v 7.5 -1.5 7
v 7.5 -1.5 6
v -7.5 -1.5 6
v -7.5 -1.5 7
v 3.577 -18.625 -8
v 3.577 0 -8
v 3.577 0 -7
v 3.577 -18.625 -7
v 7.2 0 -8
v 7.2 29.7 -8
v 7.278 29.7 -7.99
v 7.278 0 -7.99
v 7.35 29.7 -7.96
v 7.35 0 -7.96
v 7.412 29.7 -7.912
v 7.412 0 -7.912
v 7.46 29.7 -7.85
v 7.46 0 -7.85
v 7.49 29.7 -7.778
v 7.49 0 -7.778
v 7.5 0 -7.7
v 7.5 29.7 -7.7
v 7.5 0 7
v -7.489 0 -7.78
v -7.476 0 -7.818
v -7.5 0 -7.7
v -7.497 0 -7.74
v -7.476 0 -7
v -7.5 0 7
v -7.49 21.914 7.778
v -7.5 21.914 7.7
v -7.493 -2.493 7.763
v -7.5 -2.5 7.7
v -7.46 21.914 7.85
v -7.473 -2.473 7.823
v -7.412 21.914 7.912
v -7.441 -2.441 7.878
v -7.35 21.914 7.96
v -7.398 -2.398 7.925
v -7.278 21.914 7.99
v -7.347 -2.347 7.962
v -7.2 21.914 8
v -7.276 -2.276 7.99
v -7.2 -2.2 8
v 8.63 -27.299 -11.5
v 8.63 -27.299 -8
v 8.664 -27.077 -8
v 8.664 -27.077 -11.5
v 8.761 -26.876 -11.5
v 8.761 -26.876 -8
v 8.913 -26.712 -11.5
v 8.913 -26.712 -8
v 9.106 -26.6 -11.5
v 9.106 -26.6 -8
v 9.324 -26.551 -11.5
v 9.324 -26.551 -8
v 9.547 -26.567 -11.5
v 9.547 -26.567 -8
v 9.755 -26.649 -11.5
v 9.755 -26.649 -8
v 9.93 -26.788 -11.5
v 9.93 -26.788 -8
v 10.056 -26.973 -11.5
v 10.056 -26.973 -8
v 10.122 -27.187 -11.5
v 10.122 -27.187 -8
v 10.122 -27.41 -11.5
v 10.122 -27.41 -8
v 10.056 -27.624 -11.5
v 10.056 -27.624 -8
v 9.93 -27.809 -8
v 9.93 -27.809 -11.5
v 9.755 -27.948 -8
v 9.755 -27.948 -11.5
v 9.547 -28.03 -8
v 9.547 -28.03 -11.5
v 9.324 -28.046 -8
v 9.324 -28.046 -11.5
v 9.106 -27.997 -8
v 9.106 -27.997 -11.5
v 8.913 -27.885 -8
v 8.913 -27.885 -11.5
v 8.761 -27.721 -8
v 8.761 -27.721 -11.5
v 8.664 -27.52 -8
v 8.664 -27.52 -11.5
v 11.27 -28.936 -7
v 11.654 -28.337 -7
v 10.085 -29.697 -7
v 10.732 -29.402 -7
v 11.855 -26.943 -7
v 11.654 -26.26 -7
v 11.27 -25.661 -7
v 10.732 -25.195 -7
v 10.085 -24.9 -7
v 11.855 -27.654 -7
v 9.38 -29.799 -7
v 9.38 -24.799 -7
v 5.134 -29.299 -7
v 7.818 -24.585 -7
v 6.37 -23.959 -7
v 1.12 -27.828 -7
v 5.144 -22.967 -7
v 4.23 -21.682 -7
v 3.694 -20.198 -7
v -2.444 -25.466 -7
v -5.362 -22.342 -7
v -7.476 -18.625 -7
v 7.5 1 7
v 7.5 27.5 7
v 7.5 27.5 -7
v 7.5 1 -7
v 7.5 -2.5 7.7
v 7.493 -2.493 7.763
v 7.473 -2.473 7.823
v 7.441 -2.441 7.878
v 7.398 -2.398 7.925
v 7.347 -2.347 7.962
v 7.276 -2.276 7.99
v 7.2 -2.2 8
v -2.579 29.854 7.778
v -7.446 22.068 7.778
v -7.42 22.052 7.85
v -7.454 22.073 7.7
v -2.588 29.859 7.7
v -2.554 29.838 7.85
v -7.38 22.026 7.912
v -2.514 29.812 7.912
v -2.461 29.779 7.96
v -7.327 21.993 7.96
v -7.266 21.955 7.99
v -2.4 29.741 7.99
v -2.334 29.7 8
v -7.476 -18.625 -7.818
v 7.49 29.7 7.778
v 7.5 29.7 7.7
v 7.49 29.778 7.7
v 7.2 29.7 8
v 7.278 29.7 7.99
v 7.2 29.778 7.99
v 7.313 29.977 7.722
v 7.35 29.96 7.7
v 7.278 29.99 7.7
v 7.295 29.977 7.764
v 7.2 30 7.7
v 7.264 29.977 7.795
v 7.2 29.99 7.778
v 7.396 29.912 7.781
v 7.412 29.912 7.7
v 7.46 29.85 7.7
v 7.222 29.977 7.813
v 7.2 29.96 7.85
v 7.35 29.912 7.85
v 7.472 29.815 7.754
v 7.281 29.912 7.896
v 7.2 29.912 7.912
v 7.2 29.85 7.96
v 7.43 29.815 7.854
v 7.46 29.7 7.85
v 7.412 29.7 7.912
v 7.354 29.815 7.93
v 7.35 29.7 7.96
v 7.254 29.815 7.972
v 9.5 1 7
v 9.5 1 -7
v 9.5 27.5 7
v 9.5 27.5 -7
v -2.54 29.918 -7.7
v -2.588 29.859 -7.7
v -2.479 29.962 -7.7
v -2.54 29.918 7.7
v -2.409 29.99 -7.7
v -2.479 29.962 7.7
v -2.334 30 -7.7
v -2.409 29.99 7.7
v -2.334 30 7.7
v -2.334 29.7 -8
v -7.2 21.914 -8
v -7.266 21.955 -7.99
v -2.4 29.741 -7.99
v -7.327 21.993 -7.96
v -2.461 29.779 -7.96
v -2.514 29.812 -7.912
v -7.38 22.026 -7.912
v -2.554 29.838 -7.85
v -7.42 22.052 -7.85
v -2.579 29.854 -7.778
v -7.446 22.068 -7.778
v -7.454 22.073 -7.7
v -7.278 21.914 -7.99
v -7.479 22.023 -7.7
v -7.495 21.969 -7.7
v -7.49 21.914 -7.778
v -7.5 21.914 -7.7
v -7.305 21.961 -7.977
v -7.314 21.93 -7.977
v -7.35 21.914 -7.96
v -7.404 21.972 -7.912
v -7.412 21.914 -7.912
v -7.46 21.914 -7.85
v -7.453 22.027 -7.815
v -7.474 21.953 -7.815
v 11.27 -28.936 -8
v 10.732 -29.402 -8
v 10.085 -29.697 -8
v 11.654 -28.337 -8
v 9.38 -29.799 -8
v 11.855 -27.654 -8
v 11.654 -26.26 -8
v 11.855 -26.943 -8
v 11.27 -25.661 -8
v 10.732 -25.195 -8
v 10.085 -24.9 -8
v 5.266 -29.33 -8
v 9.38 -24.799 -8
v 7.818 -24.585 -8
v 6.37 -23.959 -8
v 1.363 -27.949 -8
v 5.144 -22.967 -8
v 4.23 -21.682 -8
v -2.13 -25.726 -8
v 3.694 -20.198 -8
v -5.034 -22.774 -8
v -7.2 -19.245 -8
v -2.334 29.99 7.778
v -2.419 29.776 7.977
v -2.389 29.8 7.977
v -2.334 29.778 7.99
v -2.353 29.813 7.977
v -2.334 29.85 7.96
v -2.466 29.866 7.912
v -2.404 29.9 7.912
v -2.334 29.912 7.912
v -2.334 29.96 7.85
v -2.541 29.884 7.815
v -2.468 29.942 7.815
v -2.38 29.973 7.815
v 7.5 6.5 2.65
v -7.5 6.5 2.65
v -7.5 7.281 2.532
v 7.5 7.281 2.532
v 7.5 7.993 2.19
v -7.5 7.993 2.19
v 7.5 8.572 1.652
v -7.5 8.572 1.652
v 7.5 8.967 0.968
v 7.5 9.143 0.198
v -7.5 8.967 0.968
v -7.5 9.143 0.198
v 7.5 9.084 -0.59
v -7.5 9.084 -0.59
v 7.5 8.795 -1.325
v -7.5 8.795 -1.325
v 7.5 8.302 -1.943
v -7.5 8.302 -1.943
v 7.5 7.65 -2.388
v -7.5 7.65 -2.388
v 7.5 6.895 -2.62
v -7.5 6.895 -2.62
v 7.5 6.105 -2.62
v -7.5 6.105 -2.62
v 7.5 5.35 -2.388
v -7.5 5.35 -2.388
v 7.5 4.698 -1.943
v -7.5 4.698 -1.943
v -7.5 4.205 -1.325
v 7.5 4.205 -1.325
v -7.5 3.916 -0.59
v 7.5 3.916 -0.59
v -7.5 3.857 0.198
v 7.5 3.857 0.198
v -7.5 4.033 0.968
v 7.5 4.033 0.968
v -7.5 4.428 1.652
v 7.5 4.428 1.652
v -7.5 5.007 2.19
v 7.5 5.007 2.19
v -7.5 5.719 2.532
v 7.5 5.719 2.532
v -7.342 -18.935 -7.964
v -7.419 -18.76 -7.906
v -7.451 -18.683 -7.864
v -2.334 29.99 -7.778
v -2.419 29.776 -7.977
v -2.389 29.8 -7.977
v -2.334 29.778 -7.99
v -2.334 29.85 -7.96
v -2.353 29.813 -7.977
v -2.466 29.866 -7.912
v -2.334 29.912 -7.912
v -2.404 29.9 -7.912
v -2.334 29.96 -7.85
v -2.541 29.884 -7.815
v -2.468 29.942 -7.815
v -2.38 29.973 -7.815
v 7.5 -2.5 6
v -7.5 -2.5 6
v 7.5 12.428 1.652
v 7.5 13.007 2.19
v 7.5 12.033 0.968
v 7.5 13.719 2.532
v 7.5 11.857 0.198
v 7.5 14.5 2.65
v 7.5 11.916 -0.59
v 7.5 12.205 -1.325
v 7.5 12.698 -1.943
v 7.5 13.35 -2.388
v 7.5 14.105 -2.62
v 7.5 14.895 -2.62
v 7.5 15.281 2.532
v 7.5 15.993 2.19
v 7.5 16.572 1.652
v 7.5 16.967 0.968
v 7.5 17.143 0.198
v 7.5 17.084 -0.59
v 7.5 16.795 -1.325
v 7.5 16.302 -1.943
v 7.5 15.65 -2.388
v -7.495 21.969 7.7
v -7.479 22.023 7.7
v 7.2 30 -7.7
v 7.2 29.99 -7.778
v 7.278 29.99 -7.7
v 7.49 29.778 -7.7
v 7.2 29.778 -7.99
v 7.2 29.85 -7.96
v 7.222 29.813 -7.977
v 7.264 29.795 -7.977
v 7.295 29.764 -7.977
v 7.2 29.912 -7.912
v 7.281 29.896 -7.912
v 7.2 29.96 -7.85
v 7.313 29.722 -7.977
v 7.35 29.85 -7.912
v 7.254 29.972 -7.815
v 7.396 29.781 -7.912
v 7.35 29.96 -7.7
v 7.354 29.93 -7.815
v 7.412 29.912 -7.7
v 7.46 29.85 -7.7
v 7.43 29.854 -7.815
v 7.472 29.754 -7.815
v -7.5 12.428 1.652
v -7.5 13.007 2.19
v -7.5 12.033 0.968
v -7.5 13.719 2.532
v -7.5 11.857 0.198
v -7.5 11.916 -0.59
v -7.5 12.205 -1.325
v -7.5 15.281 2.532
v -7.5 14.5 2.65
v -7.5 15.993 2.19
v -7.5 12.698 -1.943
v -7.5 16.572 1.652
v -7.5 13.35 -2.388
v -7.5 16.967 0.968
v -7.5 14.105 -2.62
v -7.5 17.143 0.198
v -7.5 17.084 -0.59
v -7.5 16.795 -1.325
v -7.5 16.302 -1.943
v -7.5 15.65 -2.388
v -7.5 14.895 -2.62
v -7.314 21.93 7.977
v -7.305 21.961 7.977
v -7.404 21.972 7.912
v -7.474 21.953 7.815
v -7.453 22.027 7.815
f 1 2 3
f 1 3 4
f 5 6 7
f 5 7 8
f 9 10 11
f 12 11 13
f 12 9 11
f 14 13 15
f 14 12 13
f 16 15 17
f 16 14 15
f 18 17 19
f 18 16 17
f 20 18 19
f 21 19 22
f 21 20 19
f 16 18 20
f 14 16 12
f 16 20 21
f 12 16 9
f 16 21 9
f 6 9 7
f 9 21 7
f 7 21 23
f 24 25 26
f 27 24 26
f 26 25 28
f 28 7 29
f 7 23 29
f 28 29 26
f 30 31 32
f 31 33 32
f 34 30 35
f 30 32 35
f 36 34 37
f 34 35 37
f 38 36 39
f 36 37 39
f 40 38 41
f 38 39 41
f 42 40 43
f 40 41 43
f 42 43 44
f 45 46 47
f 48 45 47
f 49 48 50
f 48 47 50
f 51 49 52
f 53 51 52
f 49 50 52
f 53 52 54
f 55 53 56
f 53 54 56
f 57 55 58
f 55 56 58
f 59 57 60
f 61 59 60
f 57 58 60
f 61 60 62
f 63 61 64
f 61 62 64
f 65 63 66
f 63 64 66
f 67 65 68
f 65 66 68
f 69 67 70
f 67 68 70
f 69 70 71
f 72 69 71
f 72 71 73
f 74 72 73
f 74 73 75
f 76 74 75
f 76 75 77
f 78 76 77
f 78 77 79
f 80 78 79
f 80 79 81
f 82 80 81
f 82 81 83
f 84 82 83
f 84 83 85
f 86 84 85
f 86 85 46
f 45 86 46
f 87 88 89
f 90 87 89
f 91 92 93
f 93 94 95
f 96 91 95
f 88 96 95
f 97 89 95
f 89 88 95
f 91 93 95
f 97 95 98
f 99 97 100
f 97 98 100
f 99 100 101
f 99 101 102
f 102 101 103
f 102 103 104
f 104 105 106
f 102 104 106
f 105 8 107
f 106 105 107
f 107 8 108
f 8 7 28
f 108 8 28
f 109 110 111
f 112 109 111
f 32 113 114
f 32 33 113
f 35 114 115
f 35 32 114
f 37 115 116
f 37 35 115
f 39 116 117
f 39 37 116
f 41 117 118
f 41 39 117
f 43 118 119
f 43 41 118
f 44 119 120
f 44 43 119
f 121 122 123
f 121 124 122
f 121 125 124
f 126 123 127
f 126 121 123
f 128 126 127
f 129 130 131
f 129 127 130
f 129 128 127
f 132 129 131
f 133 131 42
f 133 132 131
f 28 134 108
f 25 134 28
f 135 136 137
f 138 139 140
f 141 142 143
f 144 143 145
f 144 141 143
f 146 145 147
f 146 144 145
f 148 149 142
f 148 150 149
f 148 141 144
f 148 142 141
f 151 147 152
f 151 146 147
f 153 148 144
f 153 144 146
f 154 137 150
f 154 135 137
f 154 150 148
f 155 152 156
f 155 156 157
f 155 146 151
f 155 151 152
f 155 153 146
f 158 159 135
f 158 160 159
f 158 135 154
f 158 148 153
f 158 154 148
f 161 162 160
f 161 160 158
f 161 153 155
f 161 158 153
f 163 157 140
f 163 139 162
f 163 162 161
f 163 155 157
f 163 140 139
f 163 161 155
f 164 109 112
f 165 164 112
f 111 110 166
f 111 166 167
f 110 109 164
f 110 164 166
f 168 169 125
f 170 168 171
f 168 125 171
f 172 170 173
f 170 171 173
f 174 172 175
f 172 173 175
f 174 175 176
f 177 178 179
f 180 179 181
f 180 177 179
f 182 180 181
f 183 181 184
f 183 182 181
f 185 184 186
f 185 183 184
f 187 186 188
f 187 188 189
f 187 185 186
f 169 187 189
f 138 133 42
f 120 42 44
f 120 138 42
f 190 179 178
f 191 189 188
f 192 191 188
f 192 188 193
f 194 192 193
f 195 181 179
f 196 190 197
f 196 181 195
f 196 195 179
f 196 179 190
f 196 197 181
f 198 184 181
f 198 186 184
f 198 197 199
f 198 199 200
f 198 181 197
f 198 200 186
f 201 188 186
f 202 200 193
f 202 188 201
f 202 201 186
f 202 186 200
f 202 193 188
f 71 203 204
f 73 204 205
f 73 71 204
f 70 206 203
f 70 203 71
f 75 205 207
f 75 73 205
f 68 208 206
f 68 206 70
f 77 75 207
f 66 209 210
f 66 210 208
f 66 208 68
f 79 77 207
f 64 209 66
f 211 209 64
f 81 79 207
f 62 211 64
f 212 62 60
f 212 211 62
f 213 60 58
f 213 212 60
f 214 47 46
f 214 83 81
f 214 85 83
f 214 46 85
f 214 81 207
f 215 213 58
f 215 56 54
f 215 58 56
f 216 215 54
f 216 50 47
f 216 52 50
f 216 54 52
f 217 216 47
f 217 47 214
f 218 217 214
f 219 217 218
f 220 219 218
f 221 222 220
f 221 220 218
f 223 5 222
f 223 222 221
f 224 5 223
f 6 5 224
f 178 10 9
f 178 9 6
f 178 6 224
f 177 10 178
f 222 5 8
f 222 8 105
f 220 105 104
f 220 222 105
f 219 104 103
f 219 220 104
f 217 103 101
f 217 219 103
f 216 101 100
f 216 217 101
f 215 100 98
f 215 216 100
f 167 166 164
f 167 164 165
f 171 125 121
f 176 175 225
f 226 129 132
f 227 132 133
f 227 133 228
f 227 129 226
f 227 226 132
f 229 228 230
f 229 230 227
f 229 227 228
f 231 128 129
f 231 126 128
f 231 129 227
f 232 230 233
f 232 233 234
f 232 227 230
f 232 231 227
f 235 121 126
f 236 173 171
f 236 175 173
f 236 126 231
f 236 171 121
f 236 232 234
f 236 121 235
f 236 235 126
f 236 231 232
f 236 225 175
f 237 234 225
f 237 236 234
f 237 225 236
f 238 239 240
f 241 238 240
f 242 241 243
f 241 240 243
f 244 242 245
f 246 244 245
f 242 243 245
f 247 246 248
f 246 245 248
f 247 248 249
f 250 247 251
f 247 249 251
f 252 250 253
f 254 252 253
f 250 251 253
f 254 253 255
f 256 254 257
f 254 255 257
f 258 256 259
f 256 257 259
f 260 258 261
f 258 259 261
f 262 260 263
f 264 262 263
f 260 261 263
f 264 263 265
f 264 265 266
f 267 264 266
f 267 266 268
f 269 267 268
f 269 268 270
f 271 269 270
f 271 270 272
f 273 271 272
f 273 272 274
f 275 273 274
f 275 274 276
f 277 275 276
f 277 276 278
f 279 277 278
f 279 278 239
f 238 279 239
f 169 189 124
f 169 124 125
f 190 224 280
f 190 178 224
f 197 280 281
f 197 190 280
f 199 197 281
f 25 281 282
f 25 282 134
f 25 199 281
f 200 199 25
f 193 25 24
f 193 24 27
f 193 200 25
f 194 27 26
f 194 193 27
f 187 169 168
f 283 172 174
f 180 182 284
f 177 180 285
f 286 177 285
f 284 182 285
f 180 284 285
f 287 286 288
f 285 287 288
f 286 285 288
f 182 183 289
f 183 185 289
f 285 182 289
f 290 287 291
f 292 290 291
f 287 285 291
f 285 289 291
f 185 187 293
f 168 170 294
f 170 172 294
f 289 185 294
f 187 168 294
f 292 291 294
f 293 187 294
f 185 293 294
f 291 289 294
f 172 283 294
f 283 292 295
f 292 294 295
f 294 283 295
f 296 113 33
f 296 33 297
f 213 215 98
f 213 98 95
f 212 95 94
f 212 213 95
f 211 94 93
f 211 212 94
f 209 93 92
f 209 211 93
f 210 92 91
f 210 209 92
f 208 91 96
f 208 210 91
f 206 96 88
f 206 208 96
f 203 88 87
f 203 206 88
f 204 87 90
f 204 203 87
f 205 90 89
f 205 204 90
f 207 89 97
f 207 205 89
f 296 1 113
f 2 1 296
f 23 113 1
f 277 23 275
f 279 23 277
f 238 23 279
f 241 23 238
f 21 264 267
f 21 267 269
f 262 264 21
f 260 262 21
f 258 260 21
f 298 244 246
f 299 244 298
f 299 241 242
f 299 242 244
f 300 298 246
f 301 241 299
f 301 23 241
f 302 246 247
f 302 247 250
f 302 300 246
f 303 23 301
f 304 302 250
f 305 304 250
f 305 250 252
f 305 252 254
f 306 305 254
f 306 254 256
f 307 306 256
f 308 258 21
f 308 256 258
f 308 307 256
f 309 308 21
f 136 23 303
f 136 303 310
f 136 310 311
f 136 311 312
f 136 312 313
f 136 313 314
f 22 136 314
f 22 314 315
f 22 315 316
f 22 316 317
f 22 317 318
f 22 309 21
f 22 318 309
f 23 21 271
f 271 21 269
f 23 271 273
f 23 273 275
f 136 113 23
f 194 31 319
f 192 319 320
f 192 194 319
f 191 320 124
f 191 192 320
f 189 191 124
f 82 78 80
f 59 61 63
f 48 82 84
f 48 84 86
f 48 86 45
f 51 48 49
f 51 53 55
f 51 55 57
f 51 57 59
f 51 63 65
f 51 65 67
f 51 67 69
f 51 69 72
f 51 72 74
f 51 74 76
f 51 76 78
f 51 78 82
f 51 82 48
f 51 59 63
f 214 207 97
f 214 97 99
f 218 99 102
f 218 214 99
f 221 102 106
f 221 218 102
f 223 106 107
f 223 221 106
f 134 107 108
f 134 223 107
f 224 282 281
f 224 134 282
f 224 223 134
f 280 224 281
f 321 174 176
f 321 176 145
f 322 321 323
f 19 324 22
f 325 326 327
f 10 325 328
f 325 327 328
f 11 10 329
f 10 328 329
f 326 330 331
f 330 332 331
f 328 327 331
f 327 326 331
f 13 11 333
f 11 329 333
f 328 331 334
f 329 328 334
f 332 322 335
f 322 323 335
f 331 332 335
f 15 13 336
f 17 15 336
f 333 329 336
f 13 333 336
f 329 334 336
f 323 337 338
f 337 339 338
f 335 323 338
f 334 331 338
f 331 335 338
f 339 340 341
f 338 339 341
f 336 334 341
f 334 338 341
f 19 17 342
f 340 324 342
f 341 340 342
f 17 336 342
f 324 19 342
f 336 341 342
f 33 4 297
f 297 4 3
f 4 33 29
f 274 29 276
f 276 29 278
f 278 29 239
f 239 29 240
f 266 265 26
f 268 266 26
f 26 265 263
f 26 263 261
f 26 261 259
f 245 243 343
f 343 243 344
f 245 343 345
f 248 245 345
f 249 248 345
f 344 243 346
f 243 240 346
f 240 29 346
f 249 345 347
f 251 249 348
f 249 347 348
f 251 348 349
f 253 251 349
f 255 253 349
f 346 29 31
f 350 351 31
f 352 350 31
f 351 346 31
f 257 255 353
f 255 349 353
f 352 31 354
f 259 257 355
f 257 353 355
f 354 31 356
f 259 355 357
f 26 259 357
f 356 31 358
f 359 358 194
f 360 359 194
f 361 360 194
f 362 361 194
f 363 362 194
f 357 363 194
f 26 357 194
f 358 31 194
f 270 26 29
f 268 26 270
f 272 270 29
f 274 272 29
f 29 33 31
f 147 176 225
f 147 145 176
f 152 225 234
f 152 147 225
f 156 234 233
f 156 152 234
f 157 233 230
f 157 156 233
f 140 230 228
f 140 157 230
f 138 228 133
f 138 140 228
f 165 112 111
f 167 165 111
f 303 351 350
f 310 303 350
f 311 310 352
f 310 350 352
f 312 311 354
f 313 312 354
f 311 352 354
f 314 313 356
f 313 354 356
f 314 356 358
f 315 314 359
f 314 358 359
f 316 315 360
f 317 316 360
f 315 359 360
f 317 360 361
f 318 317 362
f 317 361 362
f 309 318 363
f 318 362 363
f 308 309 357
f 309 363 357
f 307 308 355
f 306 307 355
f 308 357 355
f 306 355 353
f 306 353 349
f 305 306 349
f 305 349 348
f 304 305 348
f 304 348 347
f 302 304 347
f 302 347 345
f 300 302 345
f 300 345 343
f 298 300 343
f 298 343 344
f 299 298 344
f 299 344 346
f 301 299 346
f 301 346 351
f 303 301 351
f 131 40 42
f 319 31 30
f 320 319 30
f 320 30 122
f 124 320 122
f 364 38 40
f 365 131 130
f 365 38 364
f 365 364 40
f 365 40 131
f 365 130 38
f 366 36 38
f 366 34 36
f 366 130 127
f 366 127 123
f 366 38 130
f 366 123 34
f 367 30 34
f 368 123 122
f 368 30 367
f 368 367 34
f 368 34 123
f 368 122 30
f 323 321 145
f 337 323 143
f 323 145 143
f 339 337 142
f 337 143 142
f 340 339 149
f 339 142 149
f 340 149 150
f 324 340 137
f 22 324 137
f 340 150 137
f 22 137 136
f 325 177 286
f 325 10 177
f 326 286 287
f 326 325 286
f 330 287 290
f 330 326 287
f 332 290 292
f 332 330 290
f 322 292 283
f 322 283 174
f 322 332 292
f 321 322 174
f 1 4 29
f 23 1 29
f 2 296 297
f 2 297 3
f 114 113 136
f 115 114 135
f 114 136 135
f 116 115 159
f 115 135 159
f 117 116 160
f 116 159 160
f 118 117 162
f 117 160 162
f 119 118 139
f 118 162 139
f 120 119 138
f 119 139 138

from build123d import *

# Parameters (mm, degrees)
BOSS_EXTRUDE1_DEPTH      = 8
BOSS_EXTRUDE4_DEPTH      = 15
SKETCH3_R                = 2.65
CUT_EXTRUDE1_DEPTH       = 35.481879299
SKETCH5_W                = 14
SKETCH5_H                = 26.5
BOSS_EXTRUDE6_DEPTH      = 2
SKETCH6_R                = 2.5
SKETCH6_R_2              = 0.75
BOSS_EXTRUDE7_DEPTH      = 1
BOSS_EXTRUDE8_DEPTH      = 3.5
BOSS_EXTRUDE8_DEPTH_BACK = 1
SKETCH6_3_R              = 0.75
FILLET1_R                = 0.3


with BuildPart() as part:
    # Sketch1 → Boss-Extrude1 (new, symmetric)
    with BuildSketch(Plane.XY):
        Polygon((7.5, 0), (-7.5, 0), (-7.5, 22), (-2.5, 30), (7.5, 30), align=None)
    extrude(amount=BOSS_EXTRUDE1_DEPTH, both=True)

    # Sketch2 → Boss-Extrude4 (add, through all)
    with BuildSketch(Plane(origin=(7.5, 0, 0), x_dir=(0, 0, -1), z_dir=(1, 0, 0))):
        Polygon((-7, 0), (-8, 0), (-8, -2.5), (-6, -2.5), (-6, -1.5), (-7, -1.5), align=None)
    extrude(amount=-BOSS_EXTRUDE4_DEPTH)

    # Sketch3 → Cut-Extrude1 (cut, through all)
    with BuildSketch(Plane.ZY.offset(7.5)):
        with Locations((0, 14.5)):
            Circle(SKETCH3_R)
        with Locations((0, 6.5)):
            Circle(SKETCH3_R)
    extrude(amount=-CUT_EXTRUDE1_DEPTH, mode=Mode.SUBTRACT)

    # Sketch6 → Boss-Extrude7 (add)
    # profile 1 of 2: a face of its own
    with BuildSketch(Plane(origin=(0, 0, -8), x_dir=(-1, 0, 0), z_dir=(0, 0, -1))):
        with BuildLine():
            ThreePointArc((-9.380331513, -29.798564223), (0.731298937, -26.751572871), (7.475992833, -18.625175706))
            Line((7.475992833, -18.625175706), (7.475992833, 0))
            Line((7.475992833, 0), (-3.577226639, 0))
            Line((-3.577226639, 0), (-3.577226639, -18.625175706))
            ThreePointArc((-3.577226639, -18.625175706), (-5.143978366, -22.966608507), (-9.380331513, -24.798564223))
            ThreePointArc((-9.380331513, -24.798564223), (-7.61256456, -25.53079727), (-6.880331513, -27.298564223))
            ThreePointArc((-6.880331513, -27.298564223), (-7.61256456, -29.066331176), (-9.380331513, -29.798564223))
        make_face()
    # profile 2 of 2: a face of its own
    with BuildSketch(Plane(origin=(0, 0, -8), x_dir=(-1, 0, 0), z_dir=(0, 0, -1))):
        with Locations((-9.380331513, -27.298564223)):
            Circle(SKETCH6_R)
        with Locations((-9.380331513, -27.298564223)):
            Circle(SKETCH6_R_2, mode=Mode.SUBTRACT)
    extrude(amount=-BOSS_EXTRUDE7_DEPTH)

    # Sketch6<3> → Boss-Extrude8 (add, two sides: drawn at the far end of the back side and taken through both)
    with BuildSketch(Plane(origin=(0, 0, -8), x_dir=(-1, 0, 0), z_dir=(0, 0, -1)).offset(-BOSS_EXTRUDE8_DEPTH_BACK)):
        with Locations((-9.380331513, -27.298564223)):
            Circle(SKETCH6_3_R)
    extrude(amount=BOSS_EXTRUDE8_DEPTH + BOSS_EXTRUDE8_DEPTH_BACK)

    # Fillet1
    fillet1_edges = [part.edges().sort_by_distance(p)[0] for p in [
        (0, -2.5, 8),
        (-7.5, 9.75, 8),
        (7.5, 13.75, 8),
        (7.5, 30, 0),
        (2.5, 30, 8),
        (2.5, 30, -8),
        (-2.5, 30, 0),
        (-5, 26, 8),
        (-7.5, 22, 0),
        (-5, 26, -8),
        (-7.5, 11, -8),
        (7.5, 15, -8),
    ]]
    fillet(fillet1_edges, radius=FILLET1_R)


with BuildPart() as body_2:
    # Sketch5 → Boss-Extrude6 (new body)
    with BuildSketch(Plane(origin=(7.5, 0, 0), x_dir=(0, 0, -1), z_dir=(1, 0, 0))):
        with Locations((0, 14.25)):
            Rectangle(SKETCH5_W, SKETCH5_H)
    extrude(amount=BOSS_EXTRUDE6_DEPTH)


solid = Compound([part.part, body_2.part])
